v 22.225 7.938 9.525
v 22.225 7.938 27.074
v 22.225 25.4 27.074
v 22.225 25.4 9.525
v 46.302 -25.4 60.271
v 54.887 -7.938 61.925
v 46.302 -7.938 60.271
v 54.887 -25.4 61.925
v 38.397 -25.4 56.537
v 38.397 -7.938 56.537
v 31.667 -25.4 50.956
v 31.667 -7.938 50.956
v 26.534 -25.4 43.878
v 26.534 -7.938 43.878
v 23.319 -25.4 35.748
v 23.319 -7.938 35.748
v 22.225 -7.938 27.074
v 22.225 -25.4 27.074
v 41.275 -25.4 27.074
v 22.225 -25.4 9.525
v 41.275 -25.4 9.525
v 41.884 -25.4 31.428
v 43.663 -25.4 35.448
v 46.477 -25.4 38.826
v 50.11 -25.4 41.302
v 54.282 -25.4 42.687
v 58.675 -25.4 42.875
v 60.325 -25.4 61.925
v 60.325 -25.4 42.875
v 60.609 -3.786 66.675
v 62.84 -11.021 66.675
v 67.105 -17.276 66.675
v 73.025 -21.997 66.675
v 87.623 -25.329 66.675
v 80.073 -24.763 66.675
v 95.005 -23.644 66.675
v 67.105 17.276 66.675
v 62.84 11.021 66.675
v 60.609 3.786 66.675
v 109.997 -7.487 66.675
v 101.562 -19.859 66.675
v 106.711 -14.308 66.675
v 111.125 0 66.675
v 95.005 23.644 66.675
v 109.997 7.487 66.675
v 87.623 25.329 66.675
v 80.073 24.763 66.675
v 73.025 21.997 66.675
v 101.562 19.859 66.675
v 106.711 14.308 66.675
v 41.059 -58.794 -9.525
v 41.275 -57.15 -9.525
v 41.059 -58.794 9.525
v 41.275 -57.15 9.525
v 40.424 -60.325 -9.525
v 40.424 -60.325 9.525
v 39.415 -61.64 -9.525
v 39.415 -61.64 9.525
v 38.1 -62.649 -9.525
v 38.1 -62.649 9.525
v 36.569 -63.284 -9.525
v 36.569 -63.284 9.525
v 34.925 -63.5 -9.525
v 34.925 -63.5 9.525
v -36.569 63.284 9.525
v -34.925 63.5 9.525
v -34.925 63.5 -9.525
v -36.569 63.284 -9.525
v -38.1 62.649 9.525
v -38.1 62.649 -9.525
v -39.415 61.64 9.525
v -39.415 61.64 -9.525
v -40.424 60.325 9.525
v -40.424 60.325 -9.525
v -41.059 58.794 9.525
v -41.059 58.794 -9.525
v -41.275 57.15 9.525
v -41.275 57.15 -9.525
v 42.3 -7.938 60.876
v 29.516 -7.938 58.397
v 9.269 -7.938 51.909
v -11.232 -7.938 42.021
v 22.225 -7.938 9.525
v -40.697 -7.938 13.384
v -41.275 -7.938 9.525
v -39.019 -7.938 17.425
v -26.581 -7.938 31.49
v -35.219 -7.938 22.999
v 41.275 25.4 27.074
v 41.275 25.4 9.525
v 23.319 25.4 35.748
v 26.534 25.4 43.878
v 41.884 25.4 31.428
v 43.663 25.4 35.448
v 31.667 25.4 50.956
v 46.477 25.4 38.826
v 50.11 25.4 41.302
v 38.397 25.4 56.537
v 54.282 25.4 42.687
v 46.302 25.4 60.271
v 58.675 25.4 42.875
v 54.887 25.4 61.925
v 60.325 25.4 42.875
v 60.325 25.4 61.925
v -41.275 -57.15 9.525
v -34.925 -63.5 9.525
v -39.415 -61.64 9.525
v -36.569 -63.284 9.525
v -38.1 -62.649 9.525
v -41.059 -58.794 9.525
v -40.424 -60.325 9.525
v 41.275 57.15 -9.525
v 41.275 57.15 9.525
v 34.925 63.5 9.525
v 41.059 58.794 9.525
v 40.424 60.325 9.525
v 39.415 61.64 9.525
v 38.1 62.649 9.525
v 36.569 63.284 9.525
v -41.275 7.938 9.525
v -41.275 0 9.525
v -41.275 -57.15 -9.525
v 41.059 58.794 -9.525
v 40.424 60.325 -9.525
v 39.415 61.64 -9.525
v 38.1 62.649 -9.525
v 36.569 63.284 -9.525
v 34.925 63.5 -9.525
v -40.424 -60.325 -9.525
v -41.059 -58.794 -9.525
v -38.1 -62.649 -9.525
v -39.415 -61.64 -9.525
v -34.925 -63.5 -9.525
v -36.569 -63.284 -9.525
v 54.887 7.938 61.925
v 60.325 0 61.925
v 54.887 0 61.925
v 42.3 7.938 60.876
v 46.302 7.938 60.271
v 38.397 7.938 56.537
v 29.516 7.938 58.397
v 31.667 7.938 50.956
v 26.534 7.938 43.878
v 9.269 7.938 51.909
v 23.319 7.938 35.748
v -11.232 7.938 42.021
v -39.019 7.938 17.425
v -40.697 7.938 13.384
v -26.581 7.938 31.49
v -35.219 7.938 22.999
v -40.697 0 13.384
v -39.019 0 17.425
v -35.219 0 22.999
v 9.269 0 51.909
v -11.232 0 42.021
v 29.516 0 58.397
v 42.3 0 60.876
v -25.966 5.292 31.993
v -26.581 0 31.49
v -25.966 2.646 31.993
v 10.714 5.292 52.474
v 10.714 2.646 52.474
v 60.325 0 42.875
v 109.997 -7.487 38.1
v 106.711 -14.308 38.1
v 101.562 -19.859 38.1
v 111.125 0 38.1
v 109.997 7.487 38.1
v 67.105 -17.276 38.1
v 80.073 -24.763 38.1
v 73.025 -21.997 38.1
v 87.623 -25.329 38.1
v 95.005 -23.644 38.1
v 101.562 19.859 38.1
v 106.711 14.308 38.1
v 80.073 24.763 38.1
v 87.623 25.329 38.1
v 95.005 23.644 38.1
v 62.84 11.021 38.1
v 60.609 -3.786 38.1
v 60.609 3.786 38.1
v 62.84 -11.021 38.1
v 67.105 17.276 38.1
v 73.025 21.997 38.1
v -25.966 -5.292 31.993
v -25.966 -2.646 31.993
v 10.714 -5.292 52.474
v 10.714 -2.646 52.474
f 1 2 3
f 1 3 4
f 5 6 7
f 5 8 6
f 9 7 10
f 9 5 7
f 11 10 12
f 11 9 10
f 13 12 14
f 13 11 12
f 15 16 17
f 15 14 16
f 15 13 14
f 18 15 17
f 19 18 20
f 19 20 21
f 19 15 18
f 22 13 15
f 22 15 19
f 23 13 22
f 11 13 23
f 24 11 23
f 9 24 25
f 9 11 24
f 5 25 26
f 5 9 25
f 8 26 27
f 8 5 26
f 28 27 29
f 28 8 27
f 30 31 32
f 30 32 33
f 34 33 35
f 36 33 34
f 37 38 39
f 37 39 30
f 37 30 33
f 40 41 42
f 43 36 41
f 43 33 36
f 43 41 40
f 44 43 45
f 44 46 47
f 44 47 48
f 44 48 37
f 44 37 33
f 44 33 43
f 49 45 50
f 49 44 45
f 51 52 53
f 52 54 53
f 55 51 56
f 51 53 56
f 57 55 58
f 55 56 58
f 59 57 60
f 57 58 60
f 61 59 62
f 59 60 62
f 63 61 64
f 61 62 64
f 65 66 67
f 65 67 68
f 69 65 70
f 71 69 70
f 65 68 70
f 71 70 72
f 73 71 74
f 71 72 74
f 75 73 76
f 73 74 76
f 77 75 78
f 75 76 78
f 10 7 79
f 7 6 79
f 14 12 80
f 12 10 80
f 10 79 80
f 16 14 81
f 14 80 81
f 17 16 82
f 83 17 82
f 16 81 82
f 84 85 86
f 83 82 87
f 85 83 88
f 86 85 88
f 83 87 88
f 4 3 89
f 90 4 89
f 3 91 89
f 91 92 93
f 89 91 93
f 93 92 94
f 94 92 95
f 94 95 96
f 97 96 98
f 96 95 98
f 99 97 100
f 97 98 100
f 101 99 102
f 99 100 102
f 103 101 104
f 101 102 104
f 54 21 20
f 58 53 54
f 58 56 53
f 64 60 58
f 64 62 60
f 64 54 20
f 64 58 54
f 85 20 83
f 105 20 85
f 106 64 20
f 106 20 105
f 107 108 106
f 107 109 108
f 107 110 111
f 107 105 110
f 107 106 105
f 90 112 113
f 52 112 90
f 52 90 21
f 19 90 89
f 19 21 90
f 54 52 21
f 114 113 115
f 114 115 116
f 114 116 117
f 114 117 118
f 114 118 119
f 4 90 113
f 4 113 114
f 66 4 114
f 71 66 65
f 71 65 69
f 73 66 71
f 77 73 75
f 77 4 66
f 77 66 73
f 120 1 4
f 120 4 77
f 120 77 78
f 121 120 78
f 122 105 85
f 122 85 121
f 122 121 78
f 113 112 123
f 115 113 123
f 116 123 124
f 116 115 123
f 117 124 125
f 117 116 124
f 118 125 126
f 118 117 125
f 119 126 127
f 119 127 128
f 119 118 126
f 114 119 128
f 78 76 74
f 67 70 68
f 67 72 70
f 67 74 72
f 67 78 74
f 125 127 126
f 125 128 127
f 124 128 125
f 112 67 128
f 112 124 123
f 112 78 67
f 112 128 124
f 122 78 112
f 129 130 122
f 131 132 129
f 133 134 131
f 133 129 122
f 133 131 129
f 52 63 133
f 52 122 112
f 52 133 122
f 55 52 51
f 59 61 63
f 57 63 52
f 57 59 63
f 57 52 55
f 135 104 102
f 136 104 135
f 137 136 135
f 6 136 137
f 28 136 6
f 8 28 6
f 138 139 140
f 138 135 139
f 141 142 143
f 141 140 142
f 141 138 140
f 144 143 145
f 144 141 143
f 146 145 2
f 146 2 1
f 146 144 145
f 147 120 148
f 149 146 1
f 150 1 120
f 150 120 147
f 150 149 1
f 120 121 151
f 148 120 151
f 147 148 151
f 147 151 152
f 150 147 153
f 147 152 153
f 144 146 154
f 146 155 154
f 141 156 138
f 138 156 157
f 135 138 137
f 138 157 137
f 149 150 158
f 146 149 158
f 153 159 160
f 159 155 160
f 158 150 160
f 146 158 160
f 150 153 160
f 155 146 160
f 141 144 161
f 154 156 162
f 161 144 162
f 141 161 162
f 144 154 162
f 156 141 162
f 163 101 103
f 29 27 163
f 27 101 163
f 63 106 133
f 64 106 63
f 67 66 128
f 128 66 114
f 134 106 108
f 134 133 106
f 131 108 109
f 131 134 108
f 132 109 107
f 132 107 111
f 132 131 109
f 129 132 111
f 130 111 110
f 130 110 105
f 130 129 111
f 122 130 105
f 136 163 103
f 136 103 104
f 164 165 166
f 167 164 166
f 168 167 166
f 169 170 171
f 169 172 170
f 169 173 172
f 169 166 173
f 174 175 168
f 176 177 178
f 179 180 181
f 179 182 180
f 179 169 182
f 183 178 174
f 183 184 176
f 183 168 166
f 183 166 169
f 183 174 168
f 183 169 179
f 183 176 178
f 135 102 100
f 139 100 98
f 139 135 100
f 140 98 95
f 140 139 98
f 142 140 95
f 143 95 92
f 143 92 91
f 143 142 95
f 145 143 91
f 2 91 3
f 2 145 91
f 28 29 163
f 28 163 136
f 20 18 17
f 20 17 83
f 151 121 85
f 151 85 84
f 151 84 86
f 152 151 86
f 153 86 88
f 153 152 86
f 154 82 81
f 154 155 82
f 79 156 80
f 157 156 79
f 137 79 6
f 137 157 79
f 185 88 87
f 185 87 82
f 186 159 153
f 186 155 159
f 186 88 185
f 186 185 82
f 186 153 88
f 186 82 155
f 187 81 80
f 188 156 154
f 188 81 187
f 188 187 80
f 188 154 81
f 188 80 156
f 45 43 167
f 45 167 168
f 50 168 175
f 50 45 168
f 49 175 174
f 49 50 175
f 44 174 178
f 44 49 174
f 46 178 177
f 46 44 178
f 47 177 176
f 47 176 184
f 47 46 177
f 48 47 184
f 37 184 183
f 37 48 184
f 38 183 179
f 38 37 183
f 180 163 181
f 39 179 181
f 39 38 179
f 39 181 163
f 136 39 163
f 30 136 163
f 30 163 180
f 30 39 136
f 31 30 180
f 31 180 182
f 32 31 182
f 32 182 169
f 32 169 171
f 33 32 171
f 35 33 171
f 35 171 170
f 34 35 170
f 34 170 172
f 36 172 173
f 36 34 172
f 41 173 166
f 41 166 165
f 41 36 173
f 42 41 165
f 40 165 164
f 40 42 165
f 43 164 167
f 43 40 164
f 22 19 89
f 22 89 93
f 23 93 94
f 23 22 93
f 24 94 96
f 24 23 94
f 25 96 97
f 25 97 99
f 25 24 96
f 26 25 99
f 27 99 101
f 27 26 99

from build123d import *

# Parameters (mm, degrees)
F1_DEPTH = 63.5
F2_DEPTH = 25.4
F3_DEPTH = 7.9375
F5_R     = 6.35
F6_R     = 6.35


with BuildPart() as f1:
    # F0 (on Front) → F1 (new body, symmetric)
    with BuildSketch(Plane.XZ):
        Polygon((22.225, 9.525), (-41.275, 9.525), (-41.275, -9.525), (41.275, -9.525), (41.275, 9.525), align=None)
    extrude(amount=F1_DEPTH, both=True)

    # F0 (on Front) → F2 (join, symmetric)
    with BuildSketch(Plane.XZ):
        with BuildLine():
            Line((22.225, 27.073585), (22.225, 9.525))
            Line((22.225, 9.525), (41.275, 9.525))
            Line((41.275, 9.525), (41.275, 27.073585))
            ThreePointArc((41.275, 27.073585), (46.477334, 38.825599), (58.674663, 42.8752))
            Line((58.674663, 42.8752), (60.325, 42.8752))
            Line((60.325, 42.8752), (60.325, 61.9252))
            Line((60.325, 61.9252), (54.887132, 61.9252))
            ThreePointArc((54.887132, 61.9252), (31.666806, 50.955848), (22.225, 27.073585))
        make_face()
    extrude(amount=F2_DEPTH, both=True)

    # F0 (on Front) → F3 (join, symmetric)
    with BuildSketch(Plane.XZ):
        with BuildLine():
            add(Edge.make_bspline(
                [(-41.275, 9.525), (-41.277573, 29.97333), (11.593641, 61.00316), (54.887132, 61.9252)],
                knots=[0, 0, 0, 0, 109.512266, 109.512266, 109.512266, 109.512266], degree=3))
            Line((-41.275, 9.525), (22.225, 9.525))
            Line((22.225, 9.525), (22.225, 27.073585))
            ThreePointArc((22.225, 27.073585), (31.666806, 50.955848), (54.887132, 61.9252))
        make_face()
    extrude(amount=F3_DEPTH, both=True)

    # F0 (on Front) → F4 (revolve)
    with BuildSketch(Plane.XZ):
        Polygon((85.725, 66.675), (85.725, 61.9252), (85.725, 42.8752), (85.725, 38.1), (111.125, 38.1), (111.125, 66.675), align=None)
    revolve(axis=Axis((85.725, 0, 52.3875), (0, 0, 1)))

    # F5
    f5_edges = [f1.edges().sort_by_distance(p)[0] for p in [
        (41.275, -63.5, 0),
    ]]
    fillet(f5_edges, radius=F5_R)

    # F6
    f6_edges = [f1.edges().sort_by_distance(p)[0] for p in [
        (-41.275, -63.5, 0),
        (41.275, 63.5, 0),
        (-41.275, 63.5, 0),
    ]]
    fillet(f6_edges, radius=F6_R)


solid = f1.part
